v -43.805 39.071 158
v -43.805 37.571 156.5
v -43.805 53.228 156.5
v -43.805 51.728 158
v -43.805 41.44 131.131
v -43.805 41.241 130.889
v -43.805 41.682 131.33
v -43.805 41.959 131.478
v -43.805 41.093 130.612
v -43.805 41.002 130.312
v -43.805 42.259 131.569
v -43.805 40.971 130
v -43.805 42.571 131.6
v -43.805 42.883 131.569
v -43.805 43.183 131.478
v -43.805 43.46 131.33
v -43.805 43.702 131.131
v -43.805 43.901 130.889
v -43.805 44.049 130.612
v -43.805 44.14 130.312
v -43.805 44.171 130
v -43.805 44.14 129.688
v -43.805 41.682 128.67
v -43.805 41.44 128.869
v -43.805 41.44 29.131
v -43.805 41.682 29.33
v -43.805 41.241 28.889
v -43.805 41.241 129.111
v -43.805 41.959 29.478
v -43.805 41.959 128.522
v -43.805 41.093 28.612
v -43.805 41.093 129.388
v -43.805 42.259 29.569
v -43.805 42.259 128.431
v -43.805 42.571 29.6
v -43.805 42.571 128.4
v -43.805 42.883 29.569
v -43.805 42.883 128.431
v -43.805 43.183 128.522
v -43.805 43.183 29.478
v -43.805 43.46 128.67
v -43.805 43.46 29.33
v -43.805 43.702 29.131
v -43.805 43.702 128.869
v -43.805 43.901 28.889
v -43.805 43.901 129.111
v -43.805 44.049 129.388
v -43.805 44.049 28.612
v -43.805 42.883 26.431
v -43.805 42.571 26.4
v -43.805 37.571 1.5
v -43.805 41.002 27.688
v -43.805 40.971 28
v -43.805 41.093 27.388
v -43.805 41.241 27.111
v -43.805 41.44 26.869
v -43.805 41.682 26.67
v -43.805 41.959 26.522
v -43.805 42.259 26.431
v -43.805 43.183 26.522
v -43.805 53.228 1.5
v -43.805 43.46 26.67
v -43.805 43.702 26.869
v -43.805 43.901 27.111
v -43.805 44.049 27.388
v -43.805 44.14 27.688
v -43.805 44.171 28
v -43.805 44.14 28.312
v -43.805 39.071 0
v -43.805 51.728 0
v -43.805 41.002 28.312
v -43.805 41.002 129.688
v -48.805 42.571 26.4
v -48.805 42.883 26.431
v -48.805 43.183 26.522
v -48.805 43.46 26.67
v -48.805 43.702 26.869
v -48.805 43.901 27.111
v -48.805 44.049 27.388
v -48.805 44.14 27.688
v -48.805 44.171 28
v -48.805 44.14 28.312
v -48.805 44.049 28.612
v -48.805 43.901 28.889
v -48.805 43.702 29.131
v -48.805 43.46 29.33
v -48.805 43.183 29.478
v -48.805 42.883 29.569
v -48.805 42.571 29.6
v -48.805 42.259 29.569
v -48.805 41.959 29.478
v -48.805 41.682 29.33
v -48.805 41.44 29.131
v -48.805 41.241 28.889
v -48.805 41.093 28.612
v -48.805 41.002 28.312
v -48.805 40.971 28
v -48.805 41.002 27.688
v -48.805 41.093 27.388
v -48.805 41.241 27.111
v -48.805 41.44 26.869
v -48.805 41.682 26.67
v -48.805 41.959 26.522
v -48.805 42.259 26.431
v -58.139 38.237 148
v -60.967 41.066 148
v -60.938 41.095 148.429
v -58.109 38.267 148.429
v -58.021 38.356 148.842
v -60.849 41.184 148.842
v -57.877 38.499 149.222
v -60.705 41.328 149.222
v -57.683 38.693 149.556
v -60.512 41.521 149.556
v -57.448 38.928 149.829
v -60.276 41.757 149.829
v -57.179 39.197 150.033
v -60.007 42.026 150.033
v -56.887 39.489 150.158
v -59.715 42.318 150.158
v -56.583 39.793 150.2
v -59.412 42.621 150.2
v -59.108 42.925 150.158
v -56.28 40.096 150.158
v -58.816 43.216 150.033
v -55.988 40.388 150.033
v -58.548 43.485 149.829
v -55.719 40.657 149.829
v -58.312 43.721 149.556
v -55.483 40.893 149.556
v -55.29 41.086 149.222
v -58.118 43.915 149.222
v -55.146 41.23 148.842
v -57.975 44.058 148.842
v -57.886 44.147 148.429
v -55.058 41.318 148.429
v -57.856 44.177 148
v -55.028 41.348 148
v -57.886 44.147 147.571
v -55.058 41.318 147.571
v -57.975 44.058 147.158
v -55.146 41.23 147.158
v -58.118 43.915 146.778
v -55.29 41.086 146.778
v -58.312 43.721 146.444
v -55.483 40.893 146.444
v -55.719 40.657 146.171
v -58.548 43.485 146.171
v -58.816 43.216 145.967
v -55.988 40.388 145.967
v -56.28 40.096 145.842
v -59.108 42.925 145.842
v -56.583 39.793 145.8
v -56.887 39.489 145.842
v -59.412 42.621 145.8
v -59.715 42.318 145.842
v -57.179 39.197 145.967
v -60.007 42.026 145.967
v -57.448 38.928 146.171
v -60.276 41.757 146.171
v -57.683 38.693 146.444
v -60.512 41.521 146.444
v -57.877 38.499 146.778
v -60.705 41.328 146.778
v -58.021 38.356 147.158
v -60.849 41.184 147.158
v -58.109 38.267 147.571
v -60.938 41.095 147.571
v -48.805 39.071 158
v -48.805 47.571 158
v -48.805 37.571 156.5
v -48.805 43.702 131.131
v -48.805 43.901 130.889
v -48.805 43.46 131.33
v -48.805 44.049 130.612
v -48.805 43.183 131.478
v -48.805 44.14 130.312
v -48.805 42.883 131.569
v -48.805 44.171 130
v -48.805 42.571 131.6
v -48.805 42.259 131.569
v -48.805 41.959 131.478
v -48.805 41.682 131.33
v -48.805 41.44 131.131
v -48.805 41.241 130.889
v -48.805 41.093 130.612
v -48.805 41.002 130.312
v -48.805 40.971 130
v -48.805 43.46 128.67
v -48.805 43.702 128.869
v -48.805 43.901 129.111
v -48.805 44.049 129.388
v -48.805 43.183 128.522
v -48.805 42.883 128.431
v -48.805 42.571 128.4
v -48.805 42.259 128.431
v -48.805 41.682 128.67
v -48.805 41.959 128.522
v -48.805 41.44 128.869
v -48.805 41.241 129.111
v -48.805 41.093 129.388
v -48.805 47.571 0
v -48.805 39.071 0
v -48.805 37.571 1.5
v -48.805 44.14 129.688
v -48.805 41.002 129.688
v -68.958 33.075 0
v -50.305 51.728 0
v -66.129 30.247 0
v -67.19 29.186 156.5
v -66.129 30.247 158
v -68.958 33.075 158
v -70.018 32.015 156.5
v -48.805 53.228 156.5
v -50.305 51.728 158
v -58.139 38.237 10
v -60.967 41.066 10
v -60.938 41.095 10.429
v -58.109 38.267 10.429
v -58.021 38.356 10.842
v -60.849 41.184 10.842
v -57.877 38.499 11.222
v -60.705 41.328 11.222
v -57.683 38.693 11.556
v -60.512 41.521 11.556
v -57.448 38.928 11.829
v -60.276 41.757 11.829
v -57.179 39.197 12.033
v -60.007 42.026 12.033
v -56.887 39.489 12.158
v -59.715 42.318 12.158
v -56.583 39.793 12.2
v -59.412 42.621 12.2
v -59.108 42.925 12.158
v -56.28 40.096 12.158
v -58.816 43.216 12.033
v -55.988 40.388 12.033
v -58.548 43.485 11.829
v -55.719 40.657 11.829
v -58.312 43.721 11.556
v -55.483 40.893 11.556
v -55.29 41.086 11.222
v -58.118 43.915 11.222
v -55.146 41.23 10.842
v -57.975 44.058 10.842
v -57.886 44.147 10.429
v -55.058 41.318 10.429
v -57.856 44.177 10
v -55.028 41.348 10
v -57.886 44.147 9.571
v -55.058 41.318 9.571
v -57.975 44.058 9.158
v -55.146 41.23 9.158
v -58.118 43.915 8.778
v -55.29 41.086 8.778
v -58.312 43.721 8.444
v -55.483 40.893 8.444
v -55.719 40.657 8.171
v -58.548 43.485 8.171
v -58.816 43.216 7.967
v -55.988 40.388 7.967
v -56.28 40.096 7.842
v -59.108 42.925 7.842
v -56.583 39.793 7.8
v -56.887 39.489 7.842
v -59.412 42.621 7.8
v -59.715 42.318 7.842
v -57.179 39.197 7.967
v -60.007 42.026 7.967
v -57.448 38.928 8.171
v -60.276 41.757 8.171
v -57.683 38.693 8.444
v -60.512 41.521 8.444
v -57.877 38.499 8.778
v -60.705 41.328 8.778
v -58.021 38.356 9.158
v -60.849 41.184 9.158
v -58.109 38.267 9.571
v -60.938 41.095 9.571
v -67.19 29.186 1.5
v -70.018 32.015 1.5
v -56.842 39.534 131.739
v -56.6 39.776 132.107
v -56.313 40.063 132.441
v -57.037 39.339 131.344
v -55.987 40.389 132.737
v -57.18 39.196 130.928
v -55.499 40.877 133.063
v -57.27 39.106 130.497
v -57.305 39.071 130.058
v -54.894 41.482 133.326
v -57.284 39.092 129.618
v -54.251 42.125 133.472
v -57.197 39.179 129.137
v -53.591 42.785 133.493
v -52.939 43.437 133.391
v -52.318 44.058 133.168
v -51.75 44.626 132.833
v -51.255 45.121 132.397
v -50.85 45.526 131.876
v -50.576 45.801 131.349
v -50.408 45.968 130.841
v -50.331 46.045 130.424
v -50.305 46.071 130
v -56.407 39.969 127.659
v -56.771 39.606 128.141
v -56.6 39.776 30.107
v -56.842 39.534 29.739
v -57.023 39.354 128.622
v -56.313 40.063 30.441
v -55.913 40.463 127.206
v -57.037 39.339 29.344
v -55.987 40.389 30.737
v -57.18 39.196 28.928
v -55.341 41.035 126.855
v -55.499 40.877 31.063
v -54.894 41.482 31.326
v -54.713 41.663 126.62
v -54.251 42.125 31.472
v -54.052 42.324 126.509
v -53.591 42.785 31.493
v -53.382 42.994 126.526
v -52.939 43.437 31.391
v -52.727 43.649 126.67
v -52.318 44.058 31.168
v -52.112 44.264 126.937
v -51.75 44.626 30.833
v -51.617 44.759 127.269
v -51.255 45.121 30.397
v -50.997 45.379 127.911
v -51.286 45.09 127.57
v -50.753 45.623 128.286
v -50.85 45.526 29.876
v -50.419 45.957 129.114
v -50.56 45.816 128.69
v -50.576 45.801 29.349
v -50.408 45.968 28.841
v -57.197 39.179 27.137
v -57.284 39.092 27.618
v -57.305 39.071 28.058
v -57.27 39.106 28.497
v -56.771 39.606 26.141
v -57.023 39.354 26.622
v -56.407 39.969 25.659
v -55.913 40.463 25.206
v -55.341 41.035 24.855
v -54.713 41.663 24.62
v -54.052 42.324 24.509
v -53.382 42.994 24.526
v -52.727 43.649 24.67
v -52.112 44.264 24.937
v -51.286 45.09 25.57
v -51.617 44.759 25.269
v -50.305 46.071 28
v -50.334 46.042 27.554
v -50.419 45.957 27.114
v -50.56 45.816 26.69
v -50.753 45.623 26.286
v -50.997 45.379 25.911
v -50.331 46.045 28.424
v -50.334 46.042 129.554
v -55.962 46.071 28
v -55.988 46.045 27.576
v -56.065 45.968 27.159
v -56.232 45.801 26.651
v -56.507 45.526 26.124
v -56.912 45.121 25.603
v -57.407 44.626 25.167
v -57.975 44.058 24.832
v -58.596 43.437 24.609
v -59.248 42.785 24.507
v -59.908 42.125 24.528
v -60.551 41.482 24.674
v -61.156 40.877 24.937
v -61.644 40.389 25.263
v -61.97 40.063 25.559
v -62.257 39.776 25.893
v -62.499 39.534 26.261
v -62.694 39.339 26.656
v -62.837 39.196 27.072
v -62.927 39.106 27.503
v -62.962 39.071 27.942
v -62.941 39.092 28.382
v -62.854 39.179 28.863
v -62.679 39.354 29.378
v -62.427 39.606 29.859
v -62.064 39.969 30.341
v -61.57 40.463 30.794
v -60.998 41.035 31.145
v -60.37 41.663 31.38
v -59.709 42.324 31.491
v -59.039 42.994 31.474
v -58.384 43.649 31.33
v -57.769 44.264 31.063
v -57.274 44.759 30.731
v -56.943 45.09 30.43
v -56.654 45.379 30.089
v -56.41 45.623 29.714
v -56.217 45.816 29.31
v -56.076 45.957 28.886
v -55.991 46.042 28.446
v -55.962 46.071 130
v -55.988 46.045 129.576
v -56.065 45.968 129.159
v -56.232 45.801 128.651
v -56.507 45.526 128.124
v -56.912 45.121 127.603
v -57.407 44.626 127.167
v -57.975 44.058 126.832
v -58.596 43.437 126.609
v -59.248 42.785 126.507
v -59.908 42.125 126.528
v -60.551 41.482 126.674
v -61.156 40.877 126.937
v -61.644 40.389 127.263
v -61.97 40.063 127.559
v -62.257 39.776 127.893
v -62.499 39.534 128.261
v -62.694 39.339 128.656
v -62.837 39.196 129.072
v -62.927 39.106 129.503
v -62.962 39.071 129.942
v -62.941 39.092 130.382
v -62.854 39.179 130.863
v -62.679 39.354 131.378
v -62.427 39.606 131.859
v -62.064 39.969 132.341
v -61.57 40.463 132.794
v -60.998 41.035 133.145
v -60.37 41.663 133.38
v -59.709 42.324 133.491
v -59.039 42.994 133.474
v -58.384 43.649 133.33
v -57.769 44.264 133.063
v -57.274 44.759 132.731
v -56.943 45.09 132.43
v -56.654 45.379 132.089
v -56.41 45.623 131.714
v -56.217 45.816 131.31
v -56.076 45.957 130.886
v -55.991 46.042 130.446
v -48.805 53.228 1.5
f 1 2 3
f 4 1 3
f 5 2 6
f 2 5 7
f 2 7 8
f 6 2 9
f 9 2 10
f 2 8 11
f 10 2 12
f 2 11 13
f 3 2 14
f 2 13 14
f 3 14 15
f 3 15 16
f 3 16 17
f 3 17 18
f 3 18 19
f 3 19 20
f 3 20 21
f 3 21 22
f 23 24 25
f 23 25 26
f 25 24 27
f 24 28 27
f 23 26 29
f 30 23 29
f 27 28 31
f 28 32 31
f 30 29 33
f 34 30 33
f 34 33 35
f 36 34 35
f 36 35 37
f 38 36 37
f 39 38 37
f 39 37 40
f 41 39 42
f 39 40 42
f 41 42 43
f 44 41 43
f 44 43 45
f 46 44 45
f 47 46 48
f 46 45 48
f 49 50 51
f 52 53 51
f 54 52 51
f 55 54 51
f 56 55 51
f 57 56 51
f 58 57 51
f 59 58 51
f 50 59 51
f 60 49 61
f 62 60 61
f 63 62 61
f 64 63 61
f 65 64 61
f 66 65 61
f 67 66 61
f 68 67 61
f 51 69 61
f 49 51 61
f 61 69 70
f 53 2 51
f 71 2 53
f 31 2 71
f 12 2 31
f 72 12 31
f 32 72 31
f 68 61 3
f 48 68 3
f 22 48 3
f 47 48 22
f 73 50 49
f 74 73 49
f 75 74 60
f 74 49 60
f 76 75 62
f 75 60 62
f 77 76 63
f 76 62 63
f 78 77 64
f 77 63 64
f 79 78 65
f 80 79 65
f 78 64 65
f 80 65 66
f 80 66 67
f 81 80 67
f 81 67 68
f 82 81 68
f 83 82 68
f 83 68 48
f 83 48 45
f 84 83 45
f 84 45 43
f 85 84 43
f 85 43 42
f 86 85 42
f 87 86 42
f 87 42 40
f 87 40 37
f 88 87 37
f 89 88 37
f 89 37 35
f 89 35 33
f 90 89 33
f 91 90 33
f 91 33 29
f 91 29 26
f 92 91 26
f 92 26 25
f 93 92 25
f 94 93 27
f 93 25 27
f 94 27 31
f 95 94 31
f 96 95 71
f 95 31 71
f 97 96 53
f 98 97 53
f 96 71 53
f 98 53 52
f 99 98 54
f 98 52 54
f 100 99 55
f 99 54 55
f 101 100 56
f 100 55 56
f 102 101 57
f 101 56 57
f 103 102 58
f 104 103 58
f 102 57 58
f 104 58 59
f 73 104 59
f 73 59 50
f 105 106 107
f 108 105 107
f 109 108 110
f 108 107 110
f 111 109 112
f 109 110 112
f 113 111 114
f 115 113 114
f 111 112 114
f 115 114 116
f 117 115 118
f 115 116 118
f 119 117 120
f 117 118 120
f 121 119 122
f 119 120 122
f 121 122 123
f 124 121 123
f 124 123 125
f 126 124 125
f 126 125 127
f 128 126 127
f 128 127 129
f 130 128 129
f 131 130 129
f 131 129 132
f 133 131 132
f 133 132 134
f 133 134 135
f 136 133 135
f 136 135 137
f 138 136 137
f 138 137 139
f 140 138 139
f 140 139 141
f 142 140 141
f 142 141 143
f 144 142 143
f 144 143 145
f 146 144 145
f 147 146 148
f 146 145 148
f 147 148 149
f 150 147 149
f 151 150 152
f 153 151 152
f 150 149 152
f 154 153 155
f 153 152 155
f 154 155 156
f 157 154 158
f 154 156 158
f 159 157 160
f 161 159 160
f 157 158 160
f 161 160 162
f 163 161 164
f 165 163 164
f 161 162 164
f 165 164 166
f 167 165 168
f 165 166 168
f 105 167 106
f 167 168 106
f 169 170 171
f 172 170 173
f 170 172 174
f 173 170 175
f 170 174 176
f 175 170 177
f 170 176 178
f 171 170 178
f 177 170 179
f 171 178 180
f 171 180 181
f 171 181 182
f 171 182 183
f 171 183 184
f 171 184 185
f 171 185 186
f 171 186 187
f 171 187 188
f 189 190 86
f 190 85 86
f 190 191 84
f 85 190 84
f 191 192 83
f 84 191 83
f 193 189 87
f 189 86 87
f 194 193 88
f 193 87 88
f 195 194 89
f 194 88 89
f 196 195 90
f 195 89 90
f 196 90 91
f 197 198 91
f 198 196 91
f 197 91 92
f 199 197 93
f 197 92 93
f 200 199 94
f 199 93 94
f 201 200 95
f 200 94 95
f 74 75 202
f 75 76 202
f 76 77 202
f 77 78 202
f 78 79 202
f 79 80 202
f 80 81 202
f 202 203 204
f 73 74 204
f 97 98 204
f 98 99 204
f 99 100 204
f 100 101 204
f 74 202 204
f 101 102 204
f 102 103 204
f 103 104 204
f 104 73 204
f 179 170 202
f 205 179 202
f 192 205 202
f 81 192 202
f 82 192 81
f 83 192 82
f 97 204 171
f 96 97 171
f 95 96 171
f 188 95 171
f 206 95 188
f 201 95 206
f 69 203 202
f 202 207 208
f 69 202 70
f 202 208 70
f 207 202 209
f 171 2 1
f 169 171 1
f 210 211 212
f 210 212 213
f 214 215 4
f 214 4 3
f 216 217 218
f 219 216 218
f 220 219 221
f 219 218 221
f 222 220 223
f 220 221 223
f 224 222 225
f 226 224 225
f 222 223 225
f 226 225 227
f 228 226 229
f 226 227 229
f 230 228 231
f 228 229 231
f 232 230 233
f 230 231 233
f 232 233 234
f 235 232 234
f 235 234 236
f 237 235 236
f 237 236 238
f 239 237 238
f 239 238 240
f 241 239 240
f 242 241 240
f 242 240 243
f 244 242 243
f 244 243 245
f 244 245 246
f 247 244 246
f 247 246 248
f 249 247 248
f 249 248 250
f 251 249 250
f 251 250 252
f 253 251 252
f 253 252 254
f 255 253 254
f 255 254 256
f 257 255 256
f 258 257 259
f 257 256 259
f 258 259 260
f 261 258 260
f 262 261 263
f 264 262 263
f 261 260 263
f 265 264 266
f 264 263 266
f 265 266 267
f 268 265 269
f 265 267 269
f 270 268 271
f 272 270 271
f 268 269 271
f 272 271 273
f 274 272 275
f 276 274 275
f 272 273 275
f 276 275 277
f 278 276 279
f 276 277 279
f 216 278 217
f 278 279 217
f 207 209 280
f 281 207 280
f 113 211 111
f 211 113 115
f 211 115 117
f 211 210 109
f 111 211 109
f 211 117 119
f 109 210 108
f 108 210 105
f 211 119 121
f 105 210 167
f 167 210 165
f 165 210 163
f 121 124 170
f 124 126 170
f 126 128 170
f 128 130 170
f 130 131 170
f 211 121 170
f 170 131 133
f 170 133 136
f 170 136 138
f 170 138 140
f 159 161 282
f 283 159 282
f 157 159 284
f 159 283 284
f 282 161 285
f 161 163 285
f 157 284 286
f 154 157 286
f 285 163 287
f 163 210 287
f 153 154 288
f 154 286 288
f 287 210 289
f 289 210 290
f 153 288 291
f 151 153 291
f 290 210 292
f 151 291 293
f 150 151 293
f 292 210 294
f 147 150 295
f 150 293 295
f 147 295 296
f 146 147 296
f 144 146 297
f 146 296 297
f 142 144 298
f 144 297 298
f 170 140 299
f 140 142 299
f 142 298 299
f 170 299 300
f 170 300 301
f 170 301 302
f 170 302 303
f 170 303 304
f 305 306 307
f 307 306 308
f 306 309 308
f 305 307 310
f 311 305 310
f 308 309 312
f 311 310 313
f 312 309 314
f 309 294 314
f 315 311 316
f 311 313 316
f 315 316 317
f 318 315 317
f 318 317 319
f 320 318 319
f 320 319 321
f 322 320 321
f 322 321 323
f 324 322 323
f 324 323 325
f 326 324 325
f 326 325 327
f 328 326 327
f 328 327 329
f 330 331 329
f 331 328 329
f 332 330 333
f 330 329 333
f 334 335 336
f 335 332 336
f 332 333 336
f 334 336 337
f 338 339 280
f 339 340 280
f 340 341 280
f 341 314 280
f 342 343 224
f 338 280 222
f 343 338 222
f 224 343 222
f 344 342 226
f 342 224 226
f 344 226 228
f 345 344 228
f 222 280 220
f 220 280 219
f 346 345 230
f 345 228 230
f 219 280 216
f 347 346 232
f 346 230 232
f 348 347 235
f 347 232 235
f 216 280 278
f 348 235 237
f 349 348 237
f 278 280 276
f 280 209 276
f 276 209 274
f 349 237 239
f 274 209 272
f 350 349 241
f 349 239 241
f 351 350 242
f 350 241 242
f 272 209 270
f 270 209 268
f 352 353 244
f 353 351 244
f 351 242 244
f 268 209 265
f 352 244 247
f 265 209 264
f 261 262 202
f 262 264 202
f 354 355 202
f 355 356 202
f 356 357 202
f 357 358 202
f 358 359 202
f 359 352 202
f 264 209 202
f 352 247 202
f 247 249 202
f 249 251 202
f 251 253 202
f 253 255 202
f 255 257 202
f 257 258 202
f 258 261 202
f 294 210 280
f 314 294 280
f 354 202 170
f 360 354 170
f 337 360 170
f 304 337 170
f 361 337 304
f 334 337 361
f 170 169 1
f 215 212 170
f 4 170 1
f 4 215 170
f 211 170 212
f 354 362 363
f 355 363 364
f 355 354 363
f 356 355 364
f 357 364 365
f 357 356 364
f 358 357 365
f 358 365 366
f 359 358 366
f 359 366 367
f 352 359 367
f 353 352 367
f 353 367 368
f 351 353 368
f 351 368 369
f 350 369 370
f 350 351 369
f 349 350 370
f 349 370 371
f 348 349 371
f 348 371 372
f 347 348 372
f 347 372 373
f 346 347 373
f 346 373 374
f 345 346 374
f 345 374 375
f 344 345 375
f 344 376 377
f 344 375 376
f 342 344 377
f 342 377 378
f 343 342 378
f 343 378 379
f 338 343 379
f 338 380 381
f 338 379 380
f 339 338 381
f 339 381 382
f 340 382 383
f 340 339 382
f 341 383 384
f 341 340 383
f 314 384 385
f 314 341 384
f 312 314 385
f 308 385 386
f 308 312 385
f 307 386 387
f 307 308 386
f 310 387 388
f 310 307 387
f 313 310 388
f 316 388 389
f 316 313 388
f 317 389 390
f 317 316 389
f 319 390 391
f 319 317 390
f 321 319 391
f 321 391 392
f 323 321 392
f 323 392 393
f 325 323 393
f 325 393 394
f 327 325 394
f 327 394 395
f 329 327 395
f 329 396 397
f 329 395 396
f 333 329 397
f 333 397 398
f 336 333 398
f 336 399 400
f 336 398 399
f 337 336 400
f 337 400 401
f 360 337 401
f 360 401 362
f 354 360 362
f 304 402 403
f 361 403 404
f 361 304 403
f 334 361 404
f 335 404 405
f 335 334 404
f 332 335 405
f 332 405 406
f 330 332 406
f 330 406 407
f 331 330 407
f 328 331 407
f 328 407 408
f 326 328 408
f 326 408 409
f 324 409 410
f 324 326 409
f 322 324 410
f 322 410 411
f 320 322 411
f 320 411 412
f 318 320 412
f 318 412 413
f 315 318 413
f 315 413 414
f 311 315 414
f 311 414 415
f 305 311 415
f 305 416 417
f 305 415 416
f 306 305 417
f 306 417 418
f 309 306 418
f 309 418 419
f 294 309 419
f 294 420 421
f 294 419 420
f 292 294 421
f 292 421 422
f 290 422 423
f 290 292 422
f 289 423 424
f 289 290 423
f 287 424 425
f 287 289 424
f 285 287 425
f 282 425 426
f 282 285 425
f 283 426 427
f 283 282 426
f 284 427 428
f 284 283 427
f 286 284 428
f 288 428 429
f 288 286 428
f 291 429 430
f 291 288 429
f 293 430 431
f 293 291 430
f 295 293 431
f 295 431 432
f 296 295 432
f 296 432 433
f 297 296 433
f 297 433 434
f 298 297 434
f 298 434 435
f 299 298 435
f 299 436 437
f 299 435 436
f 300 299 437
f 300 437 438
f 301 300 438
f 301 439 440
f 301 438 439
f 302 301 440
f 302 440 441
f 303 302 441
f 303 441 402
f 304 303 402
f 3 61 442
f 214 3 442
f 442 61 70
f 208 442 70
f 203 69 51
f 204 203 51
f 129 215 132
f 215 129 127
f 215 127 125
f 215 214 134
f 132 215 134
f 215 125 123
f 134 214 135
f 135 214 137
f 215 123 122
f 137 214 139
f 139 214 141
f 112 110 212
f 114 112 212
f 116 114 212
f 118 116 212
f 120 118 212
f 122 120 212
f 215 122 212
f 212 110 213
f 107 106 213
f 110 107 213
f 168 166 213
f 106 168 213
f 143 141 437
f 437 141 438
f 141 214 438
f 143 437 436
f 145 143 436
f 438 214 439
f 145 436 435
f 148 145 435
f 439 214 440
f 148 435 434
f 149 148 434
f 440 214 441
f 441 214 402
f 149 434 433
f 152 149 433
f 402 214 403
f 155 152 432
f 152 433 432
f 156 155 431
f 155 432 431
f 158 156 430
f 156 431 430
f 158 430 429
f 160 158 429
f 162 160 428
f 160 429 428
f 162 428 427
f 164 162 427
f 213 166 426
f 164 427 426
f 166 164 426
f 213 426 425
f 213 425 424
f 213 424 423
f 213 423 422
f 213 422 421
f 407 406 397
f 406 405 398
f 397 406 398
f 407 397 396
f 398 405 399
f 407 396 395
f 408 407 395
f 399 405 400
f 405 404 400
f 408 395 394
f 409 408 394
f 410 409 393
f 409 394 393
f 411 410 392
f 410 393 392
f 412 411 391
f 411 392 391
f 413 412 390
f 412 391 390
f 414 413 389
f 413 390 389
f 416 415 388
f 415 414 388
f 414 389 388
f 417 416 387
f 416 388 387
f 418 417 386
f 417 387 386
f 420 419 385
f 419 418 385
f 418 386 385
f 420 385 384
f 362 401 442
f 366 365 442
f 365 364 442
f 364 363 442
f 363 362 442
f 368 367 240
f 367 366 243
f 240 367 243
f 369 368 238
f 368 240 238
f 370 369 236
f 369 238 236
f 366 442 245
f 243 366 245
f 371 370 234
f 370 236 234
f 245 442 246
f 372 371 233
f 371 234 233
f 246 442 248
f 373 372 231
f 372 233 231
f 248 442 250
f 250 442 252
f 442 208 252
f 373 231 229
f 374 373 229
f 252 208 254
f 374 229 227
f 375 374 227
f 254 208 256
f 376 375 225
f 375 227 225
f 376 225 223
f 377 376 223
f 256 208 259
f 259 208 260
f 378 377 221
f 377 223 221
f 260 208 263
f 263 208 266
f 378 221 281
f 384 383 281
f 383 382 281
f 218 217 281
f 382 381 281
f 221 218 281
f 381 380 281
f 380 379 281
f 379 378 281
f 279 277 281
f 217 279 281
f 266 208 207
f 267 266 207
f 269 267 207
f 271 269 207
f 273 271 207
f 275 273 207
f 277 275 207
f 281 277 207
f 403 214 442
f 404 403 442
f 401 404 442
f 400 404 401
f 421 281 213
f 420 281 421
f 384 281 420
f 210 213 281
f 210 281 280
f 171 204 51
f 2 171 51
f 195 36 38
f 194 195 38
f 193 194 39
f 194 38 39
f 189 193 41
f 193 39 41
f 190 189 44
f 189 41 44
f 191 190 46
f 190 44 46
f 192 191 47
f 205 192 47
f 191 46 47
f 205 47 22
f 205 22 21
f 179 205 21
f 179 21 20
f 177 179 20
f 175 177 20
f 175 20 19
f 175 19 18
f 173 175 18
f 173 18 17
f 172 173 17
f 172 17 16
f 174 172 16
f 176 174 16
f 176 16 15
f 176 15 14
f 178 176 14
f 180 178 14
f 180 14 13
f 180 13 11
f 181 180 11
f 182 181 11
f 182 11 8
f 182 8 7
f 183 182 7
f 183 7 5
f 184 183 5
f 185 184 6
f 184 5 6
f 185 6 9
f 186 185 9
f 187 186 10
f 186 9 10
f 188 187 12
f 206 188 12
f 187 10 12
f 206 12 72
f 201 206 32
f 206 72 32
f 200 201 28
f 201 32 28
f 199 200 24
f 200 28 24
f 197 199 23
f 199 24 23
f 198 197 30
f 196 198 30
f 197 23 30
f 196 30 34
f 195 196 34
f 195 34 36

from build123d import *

# Parameters (mm, degrees)
EXTRUDE_1_DEPTH     = 158
SKETCH_2_R          = 1.6
CUT_EXTRUDE_1_DEPTH = 27
SKETCH_6_R          = 3.5
CUT_EXTRUDE_2_DEPTH = 21
SKETCH_7_R          = 2.2
CUT_EXTRUDE_3_DEPTH = 5
CUT_EXTRUDE_4_DEPTH = 10
CUT_EXTRUDE_5_DEPTH = 4


with BuildPart() as part:
    # 草图1 → 凸台-拉伸1 (new body)
    with BuildSketch(Plane.XY):
        Polygon((-43.805178849, 53.227759989), (-48.805178849, 53.227759989), (-70.018382284, 32.014556553), (-67.189955159, 29.186129428), (-48.805178849, 47.570905739), (-48.805178849, 37.570905739), (-43.805178849, 37.570905739), align=None)
    extrude(amount=EXTRUDE_1_DEPTH)

    # 草图2 → 切除-拉伸1 (cut)
    with BuildSketch(Plane(origin=(-43.805178849, 0, 0), x_dir=(0, 0, -1), z_dir=(1, 0, 0))):
        with Locations((-130, 42.570905739)):
            Circle(SKETCH_2_R)
        with Locations((-28, 42.570905739)):
            Circle(SKETCH_2_R)
    extrude(amount=-CUT_EXTRUDE_1_DEPTH, mode=Mode.SUBTRACT)

    # 草图6 → 切除-拉伸2 (cut)
    with BuildSketch(Plane.ZY.offset(48.805178849)):
        with Locations(Location((130, 42.570905739, 0), (0, 0, 90))):
            Circle(SKETCH_6_R)
        with Locations(Location((28, 42.570905739, 0), (0, 0, 90))):
            Circle(SKETCH_6_R)
    extrude(amount=CUT_EXTRUDE_2_DEPTH, mode=Mode.SUBTRACT)

    # 草图7 → 切除-拉伸3 (cut)
    with BuildSketch(Plane(origin=(-51.016469419, 51.016469419, 0), x_dir=(0.7071067811865521, 0.707106781186543, 0), z_dir=(-0.707106781186543, 0.7071067811865521, 0))):
        with Locations(Location((-11.872762886, -148, 0), (0, 0, 180))):
            Circle(SKETCH_7_R)
        with Locations(Location((-11.872762886, -10, 0), (0, 0, 180))):
            Circle(SKETCH_7_R)
    extrude(amount=-CUT_EXTRUDE_3_DEPTH, mode=Mode.SUBTRACT)

    # 草图8 → 切除-拉伸4 (cut)
    with BuildSketch(Plane(origin=(-43.805178849, 0, 0), x_dir=(0, 0, -1), z_dir=(1, 0, 0))):
        Polygon((-158, 53.227759989), (-158, 51.727759989), (-156.5, 53.227759989), align=None)
        Polygon((0, 53.227759989), (-1.5, 53.227759989), (0, 51.727759989), align=None)
        Polygon((-158, 39.070905739), (-158, 37.570905739), (-156.5, 37.570905739), align=None)
        Polygon((0, 37.570905739), (0, 39.070905739), (-1.5, 37.570905739), align=None)
    extrude(amount=-CUT_EXTRUDE_4_DEPTH, mode=Mode.SUBTRACT)

    # 草图9 → 切除-拉伸5 (cut)
    with BuildSketch(Plane(origin=(-48.188042294, 48.188042294, 0), x_dir=(0, 0, -1), z_dir=(0.7071067811865477, -0.7071067811865474, 0))):
        Polygon((-158, -26.872762886), (-158, -25.372762886), (-156.5, -26.872762886), align=None)
        Polygon((0, -26.872762886), (0, -25.372762886), (-1.5, -26.872762886), align=None)
    extrude(amount=-CUT_EXTRUDE_5_DEPTH, mode=Mode.SUBTRACT)


solid = part.part
